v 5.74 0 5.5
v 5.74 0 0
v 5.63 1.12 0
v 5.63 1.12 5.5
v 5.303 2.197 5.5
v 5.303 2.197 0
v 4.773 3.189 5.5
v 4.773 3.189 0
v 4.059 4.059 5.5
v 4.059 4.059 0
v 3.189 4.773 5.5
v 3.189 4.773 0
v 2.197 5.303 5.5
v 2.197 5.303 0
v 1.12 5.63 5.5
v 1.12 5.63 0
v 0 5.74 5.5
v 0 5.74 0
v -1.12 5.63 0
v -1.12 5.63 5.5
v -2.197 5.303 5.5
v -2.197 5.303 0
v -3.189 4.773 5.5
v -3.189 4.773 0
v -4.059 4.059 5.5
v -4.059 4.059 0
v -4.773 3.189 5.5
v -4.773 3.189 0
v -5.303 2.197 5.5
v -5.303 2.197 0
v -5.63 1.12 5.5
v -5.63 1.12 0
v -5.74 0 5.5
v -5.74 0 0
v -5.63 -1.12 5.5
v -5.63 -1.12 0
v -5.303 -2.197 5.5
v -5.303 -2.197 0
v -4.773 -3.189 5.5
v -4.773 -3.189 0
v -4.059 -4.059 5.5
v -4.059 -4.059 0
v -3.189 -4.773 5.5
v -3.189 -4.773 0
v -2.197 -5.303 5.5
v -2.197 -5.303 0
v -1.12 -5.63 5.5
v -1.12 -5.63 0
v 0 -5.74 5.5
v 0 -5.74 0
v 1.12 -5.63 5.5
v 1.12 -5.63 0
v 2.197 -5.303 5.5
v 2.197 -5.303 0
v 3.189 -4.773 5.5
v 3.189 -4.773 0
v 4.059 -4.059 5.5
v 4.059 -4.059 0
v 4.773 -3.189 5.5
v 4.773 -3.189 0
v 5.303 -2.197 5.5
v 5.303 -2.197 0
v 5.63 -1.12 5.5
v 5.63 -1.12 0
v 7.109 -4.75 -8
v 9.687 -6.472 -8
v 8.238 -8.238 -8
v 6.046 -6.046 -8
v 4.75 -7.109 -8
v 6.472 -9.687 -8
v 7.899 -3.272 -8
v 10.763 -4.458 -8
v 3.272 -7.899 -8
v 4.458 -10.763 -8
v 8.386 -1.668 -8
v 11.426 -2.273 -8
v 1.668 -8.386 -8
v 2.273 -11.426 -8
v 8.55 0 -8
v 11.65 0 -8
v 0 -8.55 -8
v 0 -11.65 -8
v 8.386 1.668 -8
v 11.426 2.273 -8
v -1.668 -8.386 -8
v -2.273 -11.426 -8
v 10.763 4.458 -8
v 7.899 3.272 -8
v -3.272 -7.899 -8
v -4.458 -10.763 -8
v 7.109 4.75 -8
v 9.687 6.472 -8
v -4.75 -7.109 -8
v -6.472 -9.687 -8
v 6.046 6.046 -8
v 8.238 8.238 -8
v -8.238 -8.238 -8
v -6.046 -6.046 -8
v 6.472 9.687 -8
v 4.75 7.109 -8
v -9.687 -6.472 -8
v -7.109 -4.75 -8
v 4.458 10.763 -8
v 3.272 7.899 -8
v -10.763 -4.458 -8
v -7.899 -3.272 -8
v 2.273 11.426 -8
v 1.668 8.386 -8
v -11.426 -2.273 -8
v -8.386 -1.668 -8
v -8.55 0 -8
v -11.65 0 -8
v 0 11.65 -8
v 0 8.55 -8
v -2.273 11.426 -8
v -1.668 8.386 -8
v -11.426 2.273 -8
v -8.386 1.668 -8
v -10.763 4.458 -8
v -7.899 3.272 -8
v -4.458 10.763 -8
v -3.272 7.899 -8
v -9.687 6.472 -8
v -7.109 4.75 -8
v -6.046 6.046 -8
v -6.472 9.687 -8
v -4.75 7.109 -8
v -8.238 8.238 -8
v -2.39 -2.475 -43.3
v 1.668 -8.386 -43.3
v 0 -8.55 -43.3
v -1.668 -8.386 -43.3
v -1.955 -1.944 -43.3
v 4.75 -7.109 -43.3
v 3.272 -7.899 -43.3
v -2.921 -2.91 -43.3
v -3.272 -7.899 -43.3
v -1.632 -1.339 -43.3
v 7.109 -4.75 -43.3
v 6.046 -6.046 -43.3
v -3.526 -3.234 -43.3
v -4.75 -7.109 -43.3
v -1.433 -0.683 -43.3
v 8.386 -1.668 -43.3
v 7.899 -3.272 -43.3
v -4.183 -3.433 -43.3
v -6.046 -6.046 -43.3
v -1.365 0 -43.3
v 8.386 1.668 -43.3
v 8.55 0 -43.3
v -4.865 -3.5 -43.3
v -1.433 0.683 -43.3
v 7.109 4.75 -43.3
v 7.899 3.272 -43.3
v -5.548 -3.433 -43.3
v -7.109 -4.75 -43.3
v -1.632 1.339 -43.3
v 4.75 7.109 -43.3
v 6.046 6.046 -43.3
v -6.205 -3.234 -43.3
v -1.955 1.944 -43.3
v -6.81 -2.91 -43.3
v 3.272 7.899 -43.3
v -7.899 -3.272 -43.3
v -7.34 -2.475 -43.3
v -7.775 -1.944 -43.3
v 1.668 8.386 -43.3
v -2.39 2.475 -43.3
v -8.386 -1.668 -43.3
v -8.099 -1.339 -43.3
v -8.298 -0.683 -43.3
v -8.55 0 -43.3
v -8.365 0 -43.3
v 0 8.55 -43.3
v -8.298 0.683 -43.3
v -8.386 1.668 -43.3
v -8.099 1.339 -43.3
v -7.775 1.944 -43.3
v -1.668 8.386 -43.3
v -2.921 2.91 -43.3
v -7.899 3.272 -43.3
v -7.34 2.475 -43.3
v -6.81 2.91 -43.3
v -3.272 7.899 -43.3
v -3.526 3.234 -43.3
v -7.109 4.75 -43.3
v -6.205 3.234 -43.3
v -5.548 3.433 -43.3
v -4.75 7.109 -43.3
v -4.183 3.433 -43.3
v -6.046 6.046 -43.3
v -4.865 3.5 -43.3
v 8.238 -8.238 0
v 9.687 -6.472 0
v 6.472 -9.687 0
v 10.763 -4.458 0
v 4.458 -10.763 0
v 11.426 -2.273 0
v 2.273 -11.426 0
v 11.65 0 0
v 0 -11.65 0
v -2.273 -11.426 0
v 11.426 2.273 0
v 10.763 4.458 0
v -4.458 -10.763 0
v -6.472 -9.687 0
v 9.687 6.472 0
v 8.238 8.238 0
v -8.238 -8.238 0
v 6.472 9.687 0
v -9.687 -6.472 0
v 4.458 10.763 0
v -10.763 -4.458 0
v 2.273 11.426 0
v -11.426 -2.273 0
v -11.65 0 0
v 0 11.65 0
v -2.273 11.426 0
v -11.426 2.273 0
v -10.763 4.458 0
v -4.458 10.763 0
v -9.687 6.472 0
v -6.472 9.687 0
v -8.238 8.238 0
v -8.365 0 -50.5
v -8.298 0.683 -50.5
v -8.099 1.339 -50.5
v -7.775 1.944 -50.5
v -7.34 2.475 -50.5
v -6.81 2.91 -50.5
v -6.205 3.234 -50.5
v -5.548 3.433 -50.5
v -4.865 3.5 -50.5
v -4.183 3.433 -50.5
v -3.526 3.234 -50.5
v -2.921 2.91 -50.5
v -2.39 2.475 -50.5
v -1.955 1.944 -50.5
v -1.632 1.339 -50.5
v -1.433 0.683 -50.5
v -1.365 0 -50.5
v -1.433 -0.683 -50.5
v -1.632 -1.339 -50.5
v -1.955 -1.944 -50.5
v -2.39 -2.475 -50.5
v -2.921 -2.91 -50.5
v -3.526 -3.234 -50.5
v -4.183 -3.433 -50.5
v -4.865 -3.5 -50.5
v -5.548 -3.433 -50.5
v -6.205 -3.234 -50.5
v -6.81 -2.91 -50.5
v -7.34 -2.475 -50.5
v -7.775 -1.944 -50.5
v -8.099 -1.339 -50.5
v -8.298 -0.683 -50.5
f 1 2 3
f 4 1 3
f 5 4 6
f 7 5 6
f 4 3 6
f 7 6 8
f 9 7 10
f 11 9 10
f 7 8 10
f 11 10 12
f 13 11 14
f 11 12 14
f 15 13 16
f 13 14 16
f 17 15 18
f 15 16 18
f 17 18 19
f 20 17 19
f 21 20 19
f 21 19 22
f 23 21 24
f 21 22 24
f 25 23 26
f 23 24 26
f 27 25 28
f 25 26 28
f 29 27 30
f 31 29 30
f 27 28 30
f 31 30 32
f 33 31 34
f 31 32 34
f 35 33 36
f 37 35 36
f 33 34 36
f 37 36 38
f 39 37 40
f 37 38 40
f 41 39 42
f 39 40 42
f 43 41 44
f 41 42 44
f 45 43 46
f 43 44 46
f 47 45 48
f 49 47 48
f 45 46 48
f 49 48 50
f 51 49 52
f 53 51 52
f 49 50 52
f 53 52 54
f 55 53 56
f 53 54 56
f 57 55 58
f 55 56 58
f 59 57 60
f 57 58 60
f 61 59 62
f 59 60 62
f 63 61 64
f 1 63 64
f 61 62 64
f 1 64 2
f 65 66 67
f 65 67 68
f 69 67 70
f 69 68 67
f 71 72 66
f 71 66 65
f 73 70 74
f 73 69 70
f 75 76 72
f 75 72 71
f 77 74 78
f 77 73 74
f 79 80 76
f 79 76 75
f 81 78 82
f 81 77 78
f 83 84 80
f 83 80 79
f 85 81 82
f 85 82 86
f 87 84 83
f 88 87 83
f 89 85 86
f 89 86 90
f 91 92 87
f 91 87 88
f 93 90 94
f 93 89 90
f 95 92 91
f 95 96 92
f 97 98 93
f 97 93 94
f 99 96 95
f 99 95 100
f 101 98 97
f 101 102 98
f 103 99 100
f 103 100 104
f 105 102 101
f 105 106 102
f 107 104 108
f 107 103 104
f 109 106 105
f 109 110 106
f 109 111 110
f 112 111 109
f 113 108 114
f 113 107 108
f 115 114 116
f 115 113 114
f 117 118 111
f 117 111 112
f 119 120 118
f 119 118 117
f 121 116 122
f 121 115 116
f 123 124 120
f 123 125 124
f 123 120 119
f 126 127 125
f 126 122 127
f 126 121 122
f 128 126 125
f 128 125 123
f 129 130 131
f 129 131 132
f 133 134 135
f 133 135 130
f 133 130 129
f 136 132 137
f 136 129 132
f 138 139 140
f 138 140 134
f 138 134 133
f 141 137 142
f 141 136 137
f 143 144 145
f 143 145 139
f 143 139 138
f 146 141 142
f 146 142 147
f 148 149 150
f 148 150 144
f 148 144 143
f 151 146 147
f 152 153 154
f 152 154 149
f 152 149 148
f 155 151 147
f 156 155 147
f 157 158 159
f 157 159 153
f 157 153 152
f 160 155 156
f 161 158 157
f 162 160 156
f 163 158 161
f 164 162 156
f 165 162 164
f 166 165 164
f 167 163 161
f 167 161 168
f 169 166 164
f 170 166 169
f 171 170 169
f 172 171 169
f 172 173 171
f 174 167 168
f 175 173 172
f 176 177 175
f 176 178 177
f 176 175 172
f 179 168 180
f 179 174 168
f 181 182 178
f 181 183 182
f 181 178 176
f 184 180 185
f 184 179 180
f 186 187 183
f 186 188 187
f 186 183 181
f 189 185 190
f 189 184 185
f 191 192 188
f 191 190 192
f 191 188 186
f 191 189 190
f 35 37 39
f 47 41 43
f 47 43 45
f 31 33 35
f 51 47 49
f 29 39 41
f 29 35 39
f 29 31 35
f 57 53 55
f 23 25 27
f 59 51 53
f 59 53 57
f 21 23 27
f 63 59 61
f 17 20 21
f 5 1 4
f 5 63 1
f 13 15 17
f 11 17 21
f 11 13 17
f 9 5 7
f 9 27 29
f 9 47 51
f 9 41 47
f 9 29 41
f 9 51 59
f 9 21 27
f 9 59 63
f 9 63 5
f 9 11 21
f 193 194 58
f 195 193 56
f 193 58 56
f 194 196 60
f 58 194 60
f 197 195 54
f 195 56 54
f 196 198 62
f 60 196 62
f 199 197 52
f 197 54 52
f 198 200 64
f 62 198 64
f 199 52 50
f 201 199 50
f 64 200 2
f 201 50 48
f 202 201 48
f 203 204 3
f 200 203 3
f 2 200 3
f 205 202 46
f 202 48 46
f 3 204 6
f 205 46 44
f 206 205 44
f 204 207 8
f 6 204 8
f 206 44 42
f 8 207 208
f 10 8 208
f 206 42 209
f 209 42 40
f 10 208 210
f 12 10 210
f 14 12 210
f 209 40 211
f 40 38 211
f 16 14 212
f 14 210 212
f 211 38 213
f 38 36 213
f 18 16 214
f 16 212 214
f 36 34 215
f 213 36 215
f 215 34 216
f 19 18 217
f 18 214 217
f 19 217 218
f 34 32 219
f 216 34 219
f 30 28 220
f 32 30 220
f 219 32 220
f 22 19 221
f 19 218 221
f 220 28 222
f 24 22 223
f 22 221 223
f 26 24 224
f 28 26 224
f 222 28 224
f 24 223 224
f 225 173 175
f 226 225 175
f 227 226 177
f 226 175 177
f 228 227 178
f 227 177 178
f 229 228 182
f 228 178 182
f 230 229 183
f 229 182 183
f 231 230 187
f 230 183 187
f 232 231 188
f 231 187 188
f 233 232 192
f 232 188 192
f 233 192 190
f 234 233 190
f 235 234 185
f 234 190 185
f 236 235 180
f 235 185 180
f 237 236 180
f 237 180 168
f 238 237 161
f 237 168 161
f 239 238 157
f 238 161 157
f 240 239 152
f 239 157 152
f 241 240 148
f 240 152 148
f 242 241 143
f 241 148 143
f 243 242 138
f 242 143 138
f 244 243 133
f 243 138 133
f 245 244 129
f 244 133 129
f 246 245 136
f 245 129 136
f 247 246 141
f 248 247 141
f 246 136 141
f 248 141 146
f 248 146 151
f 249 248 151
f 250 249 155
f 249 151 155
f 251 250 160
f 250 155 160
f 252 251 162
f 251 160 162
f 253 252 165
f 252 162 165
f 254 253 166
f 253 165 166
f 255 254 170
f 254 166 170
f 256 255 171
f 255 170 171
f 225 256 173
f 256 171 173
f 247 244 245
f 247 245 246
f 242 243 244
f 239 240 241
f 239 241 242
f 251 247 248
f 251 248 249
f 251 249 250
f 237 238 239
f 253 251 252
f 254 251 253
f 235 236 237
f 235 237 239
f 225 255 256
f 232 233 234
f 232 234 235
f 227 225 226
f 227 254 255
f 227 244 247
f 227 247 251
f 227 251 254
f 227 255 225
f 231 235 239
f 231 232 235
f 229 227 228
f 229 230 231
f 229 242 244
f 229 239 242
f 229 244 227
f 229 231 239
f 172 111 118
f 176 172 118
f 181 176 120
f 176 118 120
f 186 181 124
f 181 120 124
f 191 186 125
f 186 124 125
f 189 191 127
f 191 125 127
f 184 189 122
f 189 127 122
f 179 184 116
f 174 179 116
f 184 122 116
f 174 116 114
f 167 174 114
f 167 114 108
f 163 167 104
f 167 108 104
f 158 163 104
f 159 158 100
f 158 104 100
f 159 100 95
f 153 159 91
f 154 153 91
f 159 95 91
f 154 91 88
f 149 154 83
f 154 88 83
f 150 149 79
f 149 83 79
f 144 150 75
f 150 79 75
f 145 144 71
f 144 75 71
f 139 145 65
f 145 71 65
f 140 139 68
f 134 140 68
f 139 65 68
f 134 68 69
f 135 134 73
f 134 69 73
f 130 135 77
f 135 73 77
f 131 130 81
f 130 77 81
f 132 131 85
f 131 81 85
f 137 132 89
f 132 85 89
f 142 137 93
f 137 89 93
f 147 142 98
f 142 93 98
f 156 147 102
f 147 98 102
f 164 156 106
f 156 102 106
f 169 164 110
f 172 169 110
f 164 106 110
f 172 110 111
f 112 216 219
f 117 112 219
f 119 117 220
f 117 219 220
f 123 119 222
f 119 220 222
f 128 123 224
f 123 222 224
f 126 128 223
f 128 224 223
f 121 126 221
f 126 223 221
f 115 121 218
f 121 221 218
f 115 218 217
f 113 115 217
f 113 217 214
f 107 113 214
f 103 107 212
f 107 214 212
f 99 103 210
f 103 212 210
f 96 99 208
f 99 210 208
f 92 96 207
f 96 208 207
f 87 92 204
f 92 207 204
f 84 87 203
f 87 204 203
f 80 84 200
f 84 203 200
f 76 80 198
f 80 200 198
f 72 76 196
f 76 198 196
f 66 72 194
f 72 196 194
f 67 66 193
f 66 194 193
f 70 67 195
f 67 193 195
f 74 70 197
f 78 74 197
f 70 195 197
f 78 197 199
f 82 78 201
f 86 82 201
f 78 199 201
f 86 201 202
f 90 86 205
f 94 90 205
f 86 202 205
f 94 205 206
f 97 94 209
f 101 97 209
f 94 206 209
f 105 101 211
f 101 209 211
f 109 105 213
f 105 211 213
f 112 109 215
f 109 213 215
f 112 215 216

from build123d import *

# Parameters (mm, degrees)
ESQUISSE1_R        = 5.74
BOSS_EXTRU_1_DEPTH = 5.5
ESQUISSE2_R        = 11.65
BOSS_EXTRU_2_DEPTH = 8
ESQUISSE3_R        = 8.55
BOSS_EXTRU_3_DEPTH = 35.3
ESQUISSE4_R        = 3.5
BOSS_EXTRU_4_DEPTH = 7.2


with BuildPart() as part:
    # Esquisse1 → Boss.-Extru.1 (new body)
    with BuildSketch(Plane.XY):
        Circle(ESQUISSE1_R)
    extrude(amount=BOSS_EXTRU_1_DEPTH)

    # Esquisse2 → Boss.-Extru.2 (add)
    with BuildSketch(Plane(origin=(0, 0, 0), x_dir=(-1, 0, 0), z_dir=(0, 0, -1))):
        Circle(ESQUISSE2_R)
    extrude(amount=BOSS_EXTRU_2_DEPTH)

    # Esquisse3 → Boss.-Extru.3 (add)
    with BuildSketch(Plane(origin=(0, 0, -8), x_dir=(-1, 0, 0), z_dir=(0, 0, -1))):
        Circle(ESQUISSE3_R)
    extrude(amount=BOSS_EXTRU_3_DEPTH)

    # Esquisse4 → Boss.-Extru.4 (add)
    with BuildSketch(Plane(origin=(0, 0, -43.3), x_dir=(-1, 0, 0), z_dir=(0, 0, -1))):
        with Locations((4.865332224, 0)):
            Circle(ESQUISSE4_R)
    extrude(amount=BOSS_EXTRU_4_DEPTH)


solid = part.part
